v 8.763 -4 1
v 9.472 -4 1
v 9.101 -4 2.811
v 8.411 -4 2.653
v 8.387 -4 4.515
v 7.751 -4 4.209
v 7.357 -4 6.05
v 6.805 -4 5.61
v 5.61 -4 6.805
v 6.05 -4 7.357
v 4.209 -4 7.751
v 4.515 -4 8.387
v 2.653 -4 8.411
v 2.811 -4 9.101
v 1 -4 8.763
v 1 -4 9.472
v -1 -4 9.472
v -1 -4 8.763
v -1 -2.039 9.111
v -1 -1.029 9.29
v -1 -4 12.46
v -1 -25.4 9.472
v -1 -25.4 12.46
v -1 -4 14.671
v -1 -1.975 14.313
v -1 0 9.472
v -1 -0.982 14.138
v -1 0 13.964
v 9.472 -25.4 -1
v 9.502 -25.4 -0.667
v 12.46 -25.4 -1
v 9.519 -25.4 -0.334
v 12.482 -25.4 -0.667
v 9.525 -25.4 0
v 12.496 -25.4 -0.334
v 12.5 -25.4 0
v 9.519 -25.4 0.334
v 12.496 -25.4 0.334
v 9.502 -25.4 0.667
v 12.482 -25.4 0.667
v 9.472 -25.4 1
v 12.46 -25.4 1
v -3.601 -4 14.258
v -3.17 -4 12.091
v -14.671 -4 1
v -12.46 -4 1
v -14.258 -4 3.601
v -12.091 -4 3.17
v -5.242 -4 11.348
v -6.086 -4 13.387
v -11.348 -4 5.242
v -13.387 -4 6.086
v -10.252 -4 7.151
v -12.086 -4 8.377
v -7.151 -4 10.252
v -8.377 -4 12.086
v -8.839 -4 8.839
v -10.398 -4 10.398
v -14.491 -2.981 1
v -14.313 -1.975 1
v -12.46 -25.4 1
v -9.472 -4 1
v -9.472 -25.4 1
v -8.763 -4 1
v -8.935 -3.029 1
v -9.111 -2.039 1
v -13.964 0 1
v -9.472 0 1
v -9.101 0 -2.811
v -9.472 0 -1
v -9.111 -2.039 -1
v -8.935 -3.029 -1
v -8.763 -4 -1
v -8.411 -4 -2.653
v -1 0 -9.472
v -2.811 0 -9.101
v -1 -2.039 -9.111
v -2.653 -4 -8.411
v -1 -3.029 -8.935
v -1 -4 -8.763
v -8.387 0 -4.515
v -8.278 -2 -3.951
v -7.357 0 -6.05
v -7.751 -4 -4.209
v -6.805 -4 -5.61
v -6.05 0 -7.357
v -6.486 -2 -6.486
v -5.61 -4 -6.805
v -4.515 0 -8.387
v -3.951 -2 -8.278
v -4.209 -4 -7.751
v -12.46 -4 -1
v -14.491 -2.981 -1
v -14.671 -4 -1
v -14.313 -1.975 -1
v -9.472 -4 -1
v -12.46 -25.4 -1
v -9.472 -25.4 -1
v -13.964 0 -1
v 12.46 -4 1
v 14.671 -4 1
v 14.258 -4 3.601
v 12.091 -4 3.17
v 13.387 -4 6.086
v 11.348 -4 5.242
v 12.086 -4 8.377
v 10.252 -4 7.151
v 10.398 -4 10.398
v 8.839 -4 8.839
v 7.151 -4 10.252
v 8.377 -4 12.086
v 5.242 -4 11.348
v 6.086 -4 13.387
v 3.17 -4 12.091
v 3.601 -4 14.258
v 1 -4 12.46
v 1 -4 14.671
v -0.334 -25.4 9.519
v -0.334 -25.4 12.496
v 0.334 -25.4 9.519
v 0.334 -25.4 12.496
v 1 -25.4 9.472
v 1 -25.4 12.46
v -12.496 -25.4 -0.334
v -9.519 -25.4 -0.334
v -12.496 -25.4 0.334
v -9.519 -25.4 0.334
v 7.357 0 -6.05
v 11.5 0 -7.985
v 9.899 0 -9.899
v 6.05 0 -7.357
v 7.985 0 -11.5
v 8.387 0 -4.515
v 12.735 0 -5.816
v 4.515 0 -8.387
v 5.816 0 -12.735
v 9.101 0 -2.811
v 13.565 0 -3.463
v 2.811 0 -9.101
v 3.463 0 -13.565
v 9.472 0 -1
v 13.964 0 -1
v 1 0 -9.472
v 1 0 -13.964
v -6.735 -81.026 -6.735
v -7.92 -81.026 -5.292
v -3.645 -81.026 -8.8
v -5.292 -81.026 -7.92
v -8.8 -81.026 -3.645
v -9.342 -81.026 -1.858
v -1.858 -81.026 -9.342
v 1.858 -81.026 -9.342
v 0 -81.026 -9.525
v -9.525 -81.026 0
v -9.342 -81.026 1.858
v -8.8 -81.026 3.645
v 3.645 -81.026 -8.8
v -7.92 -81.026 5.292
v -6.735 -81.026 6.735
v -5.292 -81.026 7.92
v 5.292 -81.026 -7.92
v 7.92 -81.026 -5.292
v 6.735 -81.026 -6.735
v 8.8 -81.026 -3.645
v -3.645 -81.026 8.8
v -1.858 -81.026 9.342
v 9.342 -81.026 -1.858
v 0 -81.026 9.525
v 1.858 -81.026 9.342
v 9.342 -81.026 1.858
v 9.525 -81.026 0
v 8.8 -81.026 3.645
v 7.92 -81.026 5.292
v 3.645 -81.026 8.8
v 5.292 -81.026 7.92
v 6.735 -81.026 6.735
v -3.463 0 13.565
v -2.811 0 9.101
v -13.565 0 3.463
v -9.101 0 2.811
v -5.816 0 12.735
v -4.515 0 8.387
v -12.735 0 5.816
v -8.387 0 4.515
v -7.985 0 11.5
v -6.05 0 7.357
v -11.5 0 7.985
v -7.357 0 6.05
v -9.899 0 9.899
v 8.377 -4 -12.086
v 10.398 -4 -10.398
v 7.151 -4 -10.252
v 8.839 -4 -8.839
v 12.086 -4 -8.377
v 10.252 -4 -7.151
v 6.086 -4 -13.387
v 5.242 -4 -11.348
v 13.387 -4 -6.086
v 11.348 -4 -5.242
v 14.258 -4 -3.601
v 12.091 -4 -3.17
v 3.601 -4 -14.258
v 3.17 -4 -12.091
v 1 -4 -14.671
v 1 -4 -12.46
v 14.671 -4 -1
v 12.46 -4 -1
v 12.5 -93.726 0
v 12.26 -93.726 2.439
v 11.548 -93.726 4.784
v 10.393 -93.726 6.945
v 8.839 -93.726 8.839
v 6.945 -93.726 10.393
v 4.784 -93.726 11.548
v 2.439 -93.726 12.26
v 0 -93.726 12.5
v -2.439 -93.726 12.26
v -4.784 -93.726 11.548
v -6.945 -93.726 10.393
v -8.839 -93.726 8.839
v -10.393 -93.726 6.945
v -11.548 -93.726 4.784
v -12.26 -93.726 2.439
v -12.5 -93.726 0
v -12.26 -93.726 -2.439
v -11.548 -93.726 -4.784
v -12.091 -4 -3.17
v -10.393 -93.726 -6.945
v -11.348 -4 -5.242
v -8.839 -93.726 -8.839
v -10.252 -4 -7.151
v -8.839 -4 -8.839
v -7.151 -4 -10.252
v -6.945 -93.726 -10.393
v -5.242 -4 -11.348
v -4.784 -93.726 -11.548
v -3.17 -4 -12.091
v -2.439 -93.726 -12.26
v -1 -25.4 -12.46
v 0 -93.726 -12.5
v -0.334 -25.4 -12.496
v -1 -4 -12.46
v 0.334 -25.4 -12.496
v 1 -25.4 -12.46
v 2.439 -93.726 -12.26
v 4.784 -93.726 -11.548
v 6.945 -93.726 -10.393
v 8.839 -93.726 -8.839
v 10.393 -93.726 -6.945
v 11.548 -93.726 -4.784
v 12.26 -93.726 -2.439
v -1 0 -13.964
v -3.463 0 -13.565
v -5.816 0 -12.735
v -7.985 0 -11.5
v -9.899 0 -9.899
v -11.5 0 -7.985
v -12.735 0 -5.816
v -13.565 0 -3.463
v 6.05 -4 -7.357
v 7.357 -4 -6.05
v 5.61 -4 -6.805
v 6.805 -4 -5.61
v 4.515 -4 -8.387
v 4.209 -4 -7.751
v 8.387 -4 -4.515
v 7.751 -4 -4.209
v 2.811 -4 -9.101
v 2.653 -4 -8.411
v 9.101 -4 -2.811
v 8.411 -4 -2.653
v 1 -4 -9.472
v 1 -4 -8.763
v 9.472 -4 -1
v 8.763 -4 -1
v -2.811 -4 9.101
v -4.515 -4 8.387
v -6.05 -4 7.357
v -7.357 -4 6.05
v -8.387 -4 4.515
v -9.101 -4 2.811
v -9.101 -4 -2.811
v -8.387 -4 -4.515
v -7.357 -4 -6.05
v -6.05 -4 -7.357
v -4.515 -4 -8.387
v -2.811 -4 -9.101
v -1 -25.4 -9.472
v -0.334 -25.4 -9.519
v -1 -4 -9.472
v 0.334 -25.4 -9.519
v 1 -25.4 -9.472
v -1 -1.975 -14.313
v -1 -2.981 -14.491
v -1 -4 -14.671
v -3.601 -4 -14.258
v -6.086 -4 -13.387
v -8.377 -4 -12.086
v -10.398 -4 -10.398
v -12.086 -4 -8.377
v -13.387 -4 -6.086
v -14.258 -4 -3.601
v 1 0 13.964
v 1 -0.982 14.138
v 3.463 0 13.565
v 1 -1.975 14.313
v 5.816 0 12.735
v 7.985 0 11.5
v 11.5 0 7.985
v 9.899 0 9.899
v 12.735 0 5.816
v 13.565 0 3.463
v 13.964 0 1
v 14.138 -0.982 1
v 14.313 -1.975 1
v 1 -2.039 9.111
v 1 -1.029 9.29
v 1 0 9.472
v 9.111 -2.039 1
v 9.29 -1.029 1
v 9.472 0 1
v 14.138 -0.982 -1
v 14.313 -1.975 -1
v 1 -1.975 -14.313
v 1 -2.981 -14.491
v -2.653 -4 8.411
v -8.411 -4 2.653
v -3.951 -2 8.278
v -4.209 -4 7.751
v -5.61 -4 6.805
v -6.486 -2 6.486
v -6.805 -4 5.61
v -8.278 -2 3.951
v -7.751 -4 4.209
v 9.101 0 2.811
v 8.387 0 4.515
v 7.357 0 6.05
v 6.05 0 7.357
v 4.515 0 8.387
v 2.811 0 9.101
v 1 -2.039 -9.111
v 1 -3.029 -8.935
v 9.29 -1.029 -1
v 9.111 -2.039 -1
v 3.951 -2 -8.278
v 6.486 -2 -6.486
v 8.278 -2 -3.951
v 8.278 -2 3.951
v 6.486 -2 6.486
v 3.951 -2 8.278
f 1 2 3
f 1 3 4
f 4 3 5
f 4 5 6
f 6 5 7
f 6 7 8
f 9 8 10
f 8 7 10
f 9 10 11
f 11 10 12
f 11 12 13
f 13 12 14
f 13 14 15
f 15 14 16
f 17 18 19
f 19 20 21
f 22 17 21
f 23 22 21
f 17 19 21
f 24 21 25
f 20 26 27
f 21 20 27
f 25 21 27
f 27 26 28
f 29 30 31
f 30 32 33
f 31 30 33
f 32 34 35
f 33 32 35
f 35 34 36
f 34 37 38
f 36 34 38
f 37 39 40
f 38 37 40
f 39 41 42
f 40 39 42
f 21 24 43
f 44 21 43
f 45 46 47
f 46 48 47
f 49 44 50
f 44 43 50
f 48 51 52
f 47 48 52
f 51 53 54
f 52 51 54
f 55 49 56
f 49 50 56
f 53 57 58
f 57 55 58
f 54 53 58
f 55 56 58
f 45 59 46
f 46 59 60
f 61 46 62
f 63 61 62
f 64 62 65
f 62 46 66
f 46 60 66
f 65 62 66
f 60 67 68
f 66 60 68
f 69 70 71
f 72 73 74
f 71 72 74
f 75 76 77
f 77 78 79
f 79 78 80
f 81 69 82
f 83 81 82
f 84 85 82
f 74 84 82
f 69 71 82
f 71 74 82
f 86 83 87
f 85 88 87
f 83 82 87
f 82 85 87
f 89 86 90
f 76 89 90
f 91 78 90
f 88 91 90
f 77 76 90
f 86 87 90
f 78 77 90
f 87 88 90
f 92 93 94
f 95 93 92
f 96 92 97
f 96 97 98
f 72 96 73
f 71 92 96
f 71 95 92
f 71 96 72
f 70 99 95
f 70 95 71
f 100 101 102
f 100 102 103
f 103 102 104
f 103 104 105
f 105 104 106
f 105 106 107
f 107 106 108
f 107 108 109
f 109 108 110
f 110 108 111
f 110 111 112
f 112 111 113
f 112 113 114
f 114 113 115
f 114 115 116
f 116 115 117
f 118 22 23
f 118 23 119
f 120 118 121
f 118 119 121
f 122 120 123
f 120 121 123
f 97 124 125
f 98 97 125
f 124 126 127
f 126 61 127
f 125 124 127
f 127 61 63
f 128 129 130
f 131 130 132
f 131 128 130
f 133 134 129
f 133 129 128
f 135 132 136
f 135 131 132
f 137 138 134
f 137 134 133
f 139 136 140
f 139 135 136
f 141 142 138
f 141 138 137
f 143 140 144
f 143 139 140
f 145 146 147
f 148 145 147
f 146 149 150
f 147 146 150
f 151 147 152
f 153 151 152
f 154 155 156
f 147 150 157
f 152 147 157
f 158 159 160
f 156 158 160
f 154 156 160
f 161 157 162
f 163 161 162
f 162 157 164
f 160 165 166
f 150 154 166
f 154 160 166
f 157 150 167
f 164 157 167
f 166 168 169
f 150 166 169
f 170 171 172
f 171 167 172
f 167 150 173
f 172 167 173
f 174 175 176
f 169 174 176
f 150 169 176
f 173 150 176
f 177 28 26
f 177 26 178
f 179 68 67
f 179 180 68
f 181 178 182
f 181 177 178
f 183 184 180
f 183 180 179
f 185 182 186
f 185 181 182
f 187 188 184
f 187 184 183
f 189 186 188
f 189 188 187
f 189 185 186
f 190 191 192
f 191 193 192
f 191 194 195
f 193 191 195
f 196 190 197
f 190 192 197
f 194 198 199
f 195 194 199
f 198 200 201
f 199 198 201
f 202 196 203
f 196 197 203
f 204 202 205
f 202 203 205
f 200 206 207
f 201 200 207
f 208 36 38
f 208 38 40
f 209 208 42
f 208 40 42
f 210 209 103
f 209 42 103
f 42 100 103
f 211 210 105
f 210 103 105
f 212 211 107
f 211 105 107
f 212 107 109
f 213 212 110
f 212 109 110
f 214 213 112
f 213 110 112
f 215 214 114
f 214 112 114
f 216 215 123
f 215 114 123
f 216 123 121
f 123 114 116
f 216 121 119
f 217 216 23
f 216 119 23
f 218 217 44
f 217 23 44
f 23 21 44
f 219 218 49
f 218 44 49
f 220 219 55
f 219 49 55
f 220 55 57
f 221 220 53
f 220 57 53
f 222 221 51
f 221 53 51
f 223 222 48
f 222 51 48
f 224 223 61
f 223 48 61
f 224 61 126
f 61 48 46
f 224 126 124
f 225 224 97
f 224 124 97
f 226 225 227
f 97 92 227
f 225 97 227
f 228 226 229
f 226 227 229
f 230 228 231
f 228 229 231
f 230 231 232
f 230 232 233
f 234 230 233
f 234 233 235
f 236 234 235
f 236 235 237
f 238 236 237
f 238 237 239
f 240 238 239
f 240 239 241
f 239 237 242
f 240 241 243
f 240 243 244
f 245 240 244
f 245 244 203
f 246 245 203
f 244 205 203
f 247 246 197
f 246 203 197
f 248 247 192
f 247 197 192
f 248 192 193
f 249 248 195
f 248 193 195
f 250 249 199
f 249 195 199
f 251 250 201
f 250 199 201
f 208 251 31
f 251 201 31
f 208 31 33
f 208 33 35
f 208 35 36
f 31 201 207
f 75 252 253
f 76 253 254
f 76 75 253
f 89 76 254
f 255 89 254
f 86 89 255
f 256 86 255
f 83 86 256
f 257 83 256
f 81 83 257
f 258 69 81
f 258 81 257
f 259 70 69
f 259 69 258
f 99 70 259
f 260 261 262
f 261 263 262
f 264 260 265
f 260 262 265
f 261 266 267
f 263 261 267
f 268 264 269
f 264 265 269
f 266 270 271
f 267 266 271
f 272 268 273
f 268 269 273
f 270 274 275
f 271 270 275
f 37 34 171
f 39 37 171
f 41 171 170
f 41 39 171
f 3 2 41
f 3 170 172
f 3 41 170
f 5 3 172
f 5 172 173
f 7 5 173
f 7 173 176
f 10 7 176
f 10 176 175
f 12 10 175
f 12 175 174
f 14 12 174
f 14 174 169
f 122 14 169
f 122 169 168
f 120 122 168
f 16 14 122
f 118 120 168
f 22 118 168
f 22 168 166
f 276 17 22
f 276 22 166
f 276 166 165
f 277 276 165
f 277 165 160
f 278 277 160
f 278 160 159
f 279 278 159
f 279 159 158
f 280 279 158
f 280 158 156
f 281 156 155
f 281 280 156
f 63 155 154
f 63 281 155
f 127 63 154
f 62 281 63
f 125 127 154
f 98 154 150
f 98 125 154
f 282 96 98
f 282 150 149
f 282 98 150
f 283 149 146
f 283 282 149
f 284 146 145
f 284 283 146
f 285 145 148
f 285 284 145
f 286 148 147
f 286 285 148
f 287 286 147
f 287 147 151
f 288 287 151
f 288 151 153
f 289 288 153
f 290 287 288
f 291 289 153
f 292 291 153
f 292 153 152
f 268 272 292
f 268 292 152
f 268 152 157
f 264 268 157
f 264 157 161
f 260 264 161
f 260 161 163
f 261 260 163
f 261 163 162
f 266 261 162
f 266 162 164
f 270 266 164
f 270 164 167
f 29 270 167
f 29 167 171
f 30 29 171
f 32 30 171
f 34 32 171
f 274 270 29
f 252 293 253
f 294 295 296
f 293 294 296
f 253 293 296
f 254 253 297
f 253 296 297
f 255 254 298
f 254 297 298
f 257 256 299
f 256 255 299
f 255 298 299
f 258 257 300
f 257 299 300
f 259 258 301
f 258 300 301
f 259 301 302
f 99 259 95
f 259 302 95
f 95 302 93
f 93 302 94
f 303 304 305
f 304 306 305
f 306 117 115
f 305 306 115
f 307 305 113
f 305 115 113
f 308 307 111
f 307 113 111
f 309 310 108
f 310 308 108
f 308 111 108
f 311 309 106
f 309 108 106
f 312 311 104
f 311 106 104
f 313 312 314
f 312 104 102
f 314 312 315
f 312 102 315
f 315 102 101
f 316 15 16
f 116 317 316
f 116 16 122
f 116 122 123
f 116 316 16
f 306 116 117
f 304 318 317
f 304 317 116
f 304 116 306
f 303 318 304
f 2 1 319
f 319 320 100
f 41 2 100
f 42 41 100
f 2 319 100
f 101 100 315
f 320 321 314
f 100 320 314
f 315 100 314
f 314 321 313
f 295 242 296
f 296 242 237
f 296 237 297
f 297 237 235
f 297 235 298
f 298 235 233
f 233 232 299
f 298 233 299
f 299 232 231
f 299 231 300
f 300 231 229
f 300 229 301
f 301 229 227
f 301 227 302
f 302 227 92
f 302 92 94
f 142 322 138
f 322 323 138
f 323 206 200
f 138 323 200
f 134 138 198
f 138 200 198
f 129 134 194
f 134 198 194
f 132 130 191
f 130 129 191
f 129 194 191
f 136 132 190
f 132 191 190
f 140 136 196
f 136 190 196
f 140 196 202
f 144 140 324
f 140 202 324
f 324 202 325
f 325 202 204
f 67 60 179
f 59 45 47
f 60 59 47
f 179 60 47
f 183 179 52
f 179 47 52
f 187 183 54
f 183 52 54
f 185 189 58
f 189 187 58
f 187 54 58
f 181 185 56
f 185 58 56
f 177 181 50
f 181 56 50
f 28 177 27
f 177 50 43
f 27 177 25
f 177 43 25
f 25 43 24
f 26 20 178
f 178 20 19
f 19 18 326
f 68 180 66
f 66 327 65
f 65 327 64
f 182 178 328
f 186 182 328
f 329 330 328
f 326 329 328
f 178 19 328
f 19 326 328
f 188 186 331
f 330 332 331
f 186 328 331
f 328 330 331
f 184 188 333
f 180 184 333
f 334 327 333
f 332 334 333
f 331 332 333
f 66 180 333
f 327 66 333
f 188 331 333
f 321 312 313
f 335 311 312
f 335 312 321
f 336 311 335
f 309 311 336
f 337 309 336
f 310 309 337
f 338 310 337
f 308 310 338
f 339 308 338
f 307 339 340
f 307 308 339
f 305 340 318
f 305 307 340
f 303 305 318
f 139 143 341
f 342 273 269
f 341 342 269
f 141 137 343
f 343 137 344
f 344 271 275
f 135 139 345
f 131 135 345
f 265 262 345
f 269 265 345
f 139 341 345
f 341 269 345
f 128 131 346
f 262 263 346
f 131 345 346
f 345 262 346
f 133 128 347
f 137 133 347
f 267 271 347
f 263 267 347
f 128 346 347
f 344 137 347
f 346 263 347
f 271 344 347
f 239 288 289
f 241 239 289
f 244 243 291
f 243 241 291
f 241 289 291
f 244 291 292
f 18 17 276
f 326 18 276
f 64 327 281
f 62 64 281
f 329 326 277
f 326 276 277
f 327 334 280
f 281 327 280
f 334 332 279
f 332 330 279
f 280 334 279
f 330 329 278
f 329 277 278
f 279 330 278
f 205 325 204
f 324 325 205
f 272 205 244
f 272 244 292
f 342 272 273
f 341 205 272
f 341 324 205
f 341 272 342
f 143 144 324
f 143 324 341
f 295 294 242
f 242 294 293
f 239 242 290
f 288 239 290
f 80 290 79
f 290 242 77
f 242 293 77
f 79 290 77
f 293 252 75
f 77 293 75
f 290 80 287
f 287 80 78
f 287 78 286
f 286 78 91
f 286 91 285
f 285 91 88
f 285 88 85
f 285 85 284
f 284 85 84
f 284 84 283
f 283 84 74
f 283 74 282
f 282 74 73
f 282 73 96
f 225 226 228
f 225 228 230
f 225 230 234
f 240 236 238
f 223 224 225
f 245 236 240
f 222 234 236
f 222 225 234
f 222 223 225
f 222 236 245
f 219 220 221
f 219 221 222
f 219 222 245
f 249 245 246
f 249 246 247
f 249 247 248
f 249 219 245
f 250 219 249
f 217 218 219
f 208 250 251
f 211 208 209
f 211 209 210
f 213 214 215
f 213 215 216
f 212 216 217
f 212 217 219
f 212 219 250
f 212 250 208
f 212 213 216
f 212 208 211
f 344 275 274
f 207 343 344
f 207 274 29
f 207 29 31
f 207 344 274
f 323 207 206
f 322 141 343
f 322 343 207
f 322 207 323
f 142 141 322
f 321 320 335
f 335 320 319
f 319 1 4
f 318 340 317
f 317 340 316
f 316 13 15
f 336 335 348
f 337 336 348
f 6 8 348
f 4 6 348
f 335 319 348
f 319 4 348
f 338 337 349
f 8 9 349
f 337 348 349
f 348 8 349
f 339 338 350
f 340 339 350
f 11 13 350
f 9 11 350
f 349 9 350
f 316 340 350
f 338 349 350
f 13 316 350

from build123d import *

# Parameters (mm, degrees)
F0_R     = 12.5
F0_R_2   = 9.525
F1_DEPTH = 81.026
F2_R     = 14
F2_R_2   = 9.525
F3_DEPTH = 4
F3_TAPER = -10
F4_W     = 16.5
F4_H     = 2
F4_W_2   = 2
F4_H_2   = 16.5
F5_DEPTH = 25.4
F6_R     = 12.5
F7_DEPTH = 12.7


with BuildPart() as f1:
    # F0 (on Front) → F1 (new body)
    with BuildSketch(Plane.XZ):
        Circle(F0_R)
        Circle(F0_R_2, mode=Mode.SUBTRACT)
    extrude(amount=F1_DEPTH)

    # F2 (on face) → F3 (join)
    with BuildSketch(Plane(origin=(0, 0, 0), x_dir=(-1, 0, 0), z_dir=(0, 1, 0))):
        Circle(F2_R)
        Circle(F2_R_2, mode=Mode.SUBTRACT)
    extrude(amount=-F3_DEPTH, taper=F3_TAPER)

    # F4 (on face) → F5 (cut)
    with BuildSketch(Plane.XZ):
        with Locations((-9.25, 0)):
            Rectangle(F4_W, F4_H)
        with Locations((0, 9.25)):
            Rectangle(F4_W_2, F4_H_2)
        Rectangle(F4_W_2, F4_H)
        with Locations((9.25, 0)):
            Rectangle(F4_W, F4_H)
        with Locations((0, -9.25)):
            Rectangle(F4_W_2, F4_H_2)
    extrude(amount=F5_DEPTH, mode=Mode.SUBTRACT)

    # F6 (on face) → F7 (join)
    with BuildSketch(Plane.XZ.offset(81.026)):
        Circle(F6_R)
    extrude(amount=F7_DEPTH)


solid = f1.part
